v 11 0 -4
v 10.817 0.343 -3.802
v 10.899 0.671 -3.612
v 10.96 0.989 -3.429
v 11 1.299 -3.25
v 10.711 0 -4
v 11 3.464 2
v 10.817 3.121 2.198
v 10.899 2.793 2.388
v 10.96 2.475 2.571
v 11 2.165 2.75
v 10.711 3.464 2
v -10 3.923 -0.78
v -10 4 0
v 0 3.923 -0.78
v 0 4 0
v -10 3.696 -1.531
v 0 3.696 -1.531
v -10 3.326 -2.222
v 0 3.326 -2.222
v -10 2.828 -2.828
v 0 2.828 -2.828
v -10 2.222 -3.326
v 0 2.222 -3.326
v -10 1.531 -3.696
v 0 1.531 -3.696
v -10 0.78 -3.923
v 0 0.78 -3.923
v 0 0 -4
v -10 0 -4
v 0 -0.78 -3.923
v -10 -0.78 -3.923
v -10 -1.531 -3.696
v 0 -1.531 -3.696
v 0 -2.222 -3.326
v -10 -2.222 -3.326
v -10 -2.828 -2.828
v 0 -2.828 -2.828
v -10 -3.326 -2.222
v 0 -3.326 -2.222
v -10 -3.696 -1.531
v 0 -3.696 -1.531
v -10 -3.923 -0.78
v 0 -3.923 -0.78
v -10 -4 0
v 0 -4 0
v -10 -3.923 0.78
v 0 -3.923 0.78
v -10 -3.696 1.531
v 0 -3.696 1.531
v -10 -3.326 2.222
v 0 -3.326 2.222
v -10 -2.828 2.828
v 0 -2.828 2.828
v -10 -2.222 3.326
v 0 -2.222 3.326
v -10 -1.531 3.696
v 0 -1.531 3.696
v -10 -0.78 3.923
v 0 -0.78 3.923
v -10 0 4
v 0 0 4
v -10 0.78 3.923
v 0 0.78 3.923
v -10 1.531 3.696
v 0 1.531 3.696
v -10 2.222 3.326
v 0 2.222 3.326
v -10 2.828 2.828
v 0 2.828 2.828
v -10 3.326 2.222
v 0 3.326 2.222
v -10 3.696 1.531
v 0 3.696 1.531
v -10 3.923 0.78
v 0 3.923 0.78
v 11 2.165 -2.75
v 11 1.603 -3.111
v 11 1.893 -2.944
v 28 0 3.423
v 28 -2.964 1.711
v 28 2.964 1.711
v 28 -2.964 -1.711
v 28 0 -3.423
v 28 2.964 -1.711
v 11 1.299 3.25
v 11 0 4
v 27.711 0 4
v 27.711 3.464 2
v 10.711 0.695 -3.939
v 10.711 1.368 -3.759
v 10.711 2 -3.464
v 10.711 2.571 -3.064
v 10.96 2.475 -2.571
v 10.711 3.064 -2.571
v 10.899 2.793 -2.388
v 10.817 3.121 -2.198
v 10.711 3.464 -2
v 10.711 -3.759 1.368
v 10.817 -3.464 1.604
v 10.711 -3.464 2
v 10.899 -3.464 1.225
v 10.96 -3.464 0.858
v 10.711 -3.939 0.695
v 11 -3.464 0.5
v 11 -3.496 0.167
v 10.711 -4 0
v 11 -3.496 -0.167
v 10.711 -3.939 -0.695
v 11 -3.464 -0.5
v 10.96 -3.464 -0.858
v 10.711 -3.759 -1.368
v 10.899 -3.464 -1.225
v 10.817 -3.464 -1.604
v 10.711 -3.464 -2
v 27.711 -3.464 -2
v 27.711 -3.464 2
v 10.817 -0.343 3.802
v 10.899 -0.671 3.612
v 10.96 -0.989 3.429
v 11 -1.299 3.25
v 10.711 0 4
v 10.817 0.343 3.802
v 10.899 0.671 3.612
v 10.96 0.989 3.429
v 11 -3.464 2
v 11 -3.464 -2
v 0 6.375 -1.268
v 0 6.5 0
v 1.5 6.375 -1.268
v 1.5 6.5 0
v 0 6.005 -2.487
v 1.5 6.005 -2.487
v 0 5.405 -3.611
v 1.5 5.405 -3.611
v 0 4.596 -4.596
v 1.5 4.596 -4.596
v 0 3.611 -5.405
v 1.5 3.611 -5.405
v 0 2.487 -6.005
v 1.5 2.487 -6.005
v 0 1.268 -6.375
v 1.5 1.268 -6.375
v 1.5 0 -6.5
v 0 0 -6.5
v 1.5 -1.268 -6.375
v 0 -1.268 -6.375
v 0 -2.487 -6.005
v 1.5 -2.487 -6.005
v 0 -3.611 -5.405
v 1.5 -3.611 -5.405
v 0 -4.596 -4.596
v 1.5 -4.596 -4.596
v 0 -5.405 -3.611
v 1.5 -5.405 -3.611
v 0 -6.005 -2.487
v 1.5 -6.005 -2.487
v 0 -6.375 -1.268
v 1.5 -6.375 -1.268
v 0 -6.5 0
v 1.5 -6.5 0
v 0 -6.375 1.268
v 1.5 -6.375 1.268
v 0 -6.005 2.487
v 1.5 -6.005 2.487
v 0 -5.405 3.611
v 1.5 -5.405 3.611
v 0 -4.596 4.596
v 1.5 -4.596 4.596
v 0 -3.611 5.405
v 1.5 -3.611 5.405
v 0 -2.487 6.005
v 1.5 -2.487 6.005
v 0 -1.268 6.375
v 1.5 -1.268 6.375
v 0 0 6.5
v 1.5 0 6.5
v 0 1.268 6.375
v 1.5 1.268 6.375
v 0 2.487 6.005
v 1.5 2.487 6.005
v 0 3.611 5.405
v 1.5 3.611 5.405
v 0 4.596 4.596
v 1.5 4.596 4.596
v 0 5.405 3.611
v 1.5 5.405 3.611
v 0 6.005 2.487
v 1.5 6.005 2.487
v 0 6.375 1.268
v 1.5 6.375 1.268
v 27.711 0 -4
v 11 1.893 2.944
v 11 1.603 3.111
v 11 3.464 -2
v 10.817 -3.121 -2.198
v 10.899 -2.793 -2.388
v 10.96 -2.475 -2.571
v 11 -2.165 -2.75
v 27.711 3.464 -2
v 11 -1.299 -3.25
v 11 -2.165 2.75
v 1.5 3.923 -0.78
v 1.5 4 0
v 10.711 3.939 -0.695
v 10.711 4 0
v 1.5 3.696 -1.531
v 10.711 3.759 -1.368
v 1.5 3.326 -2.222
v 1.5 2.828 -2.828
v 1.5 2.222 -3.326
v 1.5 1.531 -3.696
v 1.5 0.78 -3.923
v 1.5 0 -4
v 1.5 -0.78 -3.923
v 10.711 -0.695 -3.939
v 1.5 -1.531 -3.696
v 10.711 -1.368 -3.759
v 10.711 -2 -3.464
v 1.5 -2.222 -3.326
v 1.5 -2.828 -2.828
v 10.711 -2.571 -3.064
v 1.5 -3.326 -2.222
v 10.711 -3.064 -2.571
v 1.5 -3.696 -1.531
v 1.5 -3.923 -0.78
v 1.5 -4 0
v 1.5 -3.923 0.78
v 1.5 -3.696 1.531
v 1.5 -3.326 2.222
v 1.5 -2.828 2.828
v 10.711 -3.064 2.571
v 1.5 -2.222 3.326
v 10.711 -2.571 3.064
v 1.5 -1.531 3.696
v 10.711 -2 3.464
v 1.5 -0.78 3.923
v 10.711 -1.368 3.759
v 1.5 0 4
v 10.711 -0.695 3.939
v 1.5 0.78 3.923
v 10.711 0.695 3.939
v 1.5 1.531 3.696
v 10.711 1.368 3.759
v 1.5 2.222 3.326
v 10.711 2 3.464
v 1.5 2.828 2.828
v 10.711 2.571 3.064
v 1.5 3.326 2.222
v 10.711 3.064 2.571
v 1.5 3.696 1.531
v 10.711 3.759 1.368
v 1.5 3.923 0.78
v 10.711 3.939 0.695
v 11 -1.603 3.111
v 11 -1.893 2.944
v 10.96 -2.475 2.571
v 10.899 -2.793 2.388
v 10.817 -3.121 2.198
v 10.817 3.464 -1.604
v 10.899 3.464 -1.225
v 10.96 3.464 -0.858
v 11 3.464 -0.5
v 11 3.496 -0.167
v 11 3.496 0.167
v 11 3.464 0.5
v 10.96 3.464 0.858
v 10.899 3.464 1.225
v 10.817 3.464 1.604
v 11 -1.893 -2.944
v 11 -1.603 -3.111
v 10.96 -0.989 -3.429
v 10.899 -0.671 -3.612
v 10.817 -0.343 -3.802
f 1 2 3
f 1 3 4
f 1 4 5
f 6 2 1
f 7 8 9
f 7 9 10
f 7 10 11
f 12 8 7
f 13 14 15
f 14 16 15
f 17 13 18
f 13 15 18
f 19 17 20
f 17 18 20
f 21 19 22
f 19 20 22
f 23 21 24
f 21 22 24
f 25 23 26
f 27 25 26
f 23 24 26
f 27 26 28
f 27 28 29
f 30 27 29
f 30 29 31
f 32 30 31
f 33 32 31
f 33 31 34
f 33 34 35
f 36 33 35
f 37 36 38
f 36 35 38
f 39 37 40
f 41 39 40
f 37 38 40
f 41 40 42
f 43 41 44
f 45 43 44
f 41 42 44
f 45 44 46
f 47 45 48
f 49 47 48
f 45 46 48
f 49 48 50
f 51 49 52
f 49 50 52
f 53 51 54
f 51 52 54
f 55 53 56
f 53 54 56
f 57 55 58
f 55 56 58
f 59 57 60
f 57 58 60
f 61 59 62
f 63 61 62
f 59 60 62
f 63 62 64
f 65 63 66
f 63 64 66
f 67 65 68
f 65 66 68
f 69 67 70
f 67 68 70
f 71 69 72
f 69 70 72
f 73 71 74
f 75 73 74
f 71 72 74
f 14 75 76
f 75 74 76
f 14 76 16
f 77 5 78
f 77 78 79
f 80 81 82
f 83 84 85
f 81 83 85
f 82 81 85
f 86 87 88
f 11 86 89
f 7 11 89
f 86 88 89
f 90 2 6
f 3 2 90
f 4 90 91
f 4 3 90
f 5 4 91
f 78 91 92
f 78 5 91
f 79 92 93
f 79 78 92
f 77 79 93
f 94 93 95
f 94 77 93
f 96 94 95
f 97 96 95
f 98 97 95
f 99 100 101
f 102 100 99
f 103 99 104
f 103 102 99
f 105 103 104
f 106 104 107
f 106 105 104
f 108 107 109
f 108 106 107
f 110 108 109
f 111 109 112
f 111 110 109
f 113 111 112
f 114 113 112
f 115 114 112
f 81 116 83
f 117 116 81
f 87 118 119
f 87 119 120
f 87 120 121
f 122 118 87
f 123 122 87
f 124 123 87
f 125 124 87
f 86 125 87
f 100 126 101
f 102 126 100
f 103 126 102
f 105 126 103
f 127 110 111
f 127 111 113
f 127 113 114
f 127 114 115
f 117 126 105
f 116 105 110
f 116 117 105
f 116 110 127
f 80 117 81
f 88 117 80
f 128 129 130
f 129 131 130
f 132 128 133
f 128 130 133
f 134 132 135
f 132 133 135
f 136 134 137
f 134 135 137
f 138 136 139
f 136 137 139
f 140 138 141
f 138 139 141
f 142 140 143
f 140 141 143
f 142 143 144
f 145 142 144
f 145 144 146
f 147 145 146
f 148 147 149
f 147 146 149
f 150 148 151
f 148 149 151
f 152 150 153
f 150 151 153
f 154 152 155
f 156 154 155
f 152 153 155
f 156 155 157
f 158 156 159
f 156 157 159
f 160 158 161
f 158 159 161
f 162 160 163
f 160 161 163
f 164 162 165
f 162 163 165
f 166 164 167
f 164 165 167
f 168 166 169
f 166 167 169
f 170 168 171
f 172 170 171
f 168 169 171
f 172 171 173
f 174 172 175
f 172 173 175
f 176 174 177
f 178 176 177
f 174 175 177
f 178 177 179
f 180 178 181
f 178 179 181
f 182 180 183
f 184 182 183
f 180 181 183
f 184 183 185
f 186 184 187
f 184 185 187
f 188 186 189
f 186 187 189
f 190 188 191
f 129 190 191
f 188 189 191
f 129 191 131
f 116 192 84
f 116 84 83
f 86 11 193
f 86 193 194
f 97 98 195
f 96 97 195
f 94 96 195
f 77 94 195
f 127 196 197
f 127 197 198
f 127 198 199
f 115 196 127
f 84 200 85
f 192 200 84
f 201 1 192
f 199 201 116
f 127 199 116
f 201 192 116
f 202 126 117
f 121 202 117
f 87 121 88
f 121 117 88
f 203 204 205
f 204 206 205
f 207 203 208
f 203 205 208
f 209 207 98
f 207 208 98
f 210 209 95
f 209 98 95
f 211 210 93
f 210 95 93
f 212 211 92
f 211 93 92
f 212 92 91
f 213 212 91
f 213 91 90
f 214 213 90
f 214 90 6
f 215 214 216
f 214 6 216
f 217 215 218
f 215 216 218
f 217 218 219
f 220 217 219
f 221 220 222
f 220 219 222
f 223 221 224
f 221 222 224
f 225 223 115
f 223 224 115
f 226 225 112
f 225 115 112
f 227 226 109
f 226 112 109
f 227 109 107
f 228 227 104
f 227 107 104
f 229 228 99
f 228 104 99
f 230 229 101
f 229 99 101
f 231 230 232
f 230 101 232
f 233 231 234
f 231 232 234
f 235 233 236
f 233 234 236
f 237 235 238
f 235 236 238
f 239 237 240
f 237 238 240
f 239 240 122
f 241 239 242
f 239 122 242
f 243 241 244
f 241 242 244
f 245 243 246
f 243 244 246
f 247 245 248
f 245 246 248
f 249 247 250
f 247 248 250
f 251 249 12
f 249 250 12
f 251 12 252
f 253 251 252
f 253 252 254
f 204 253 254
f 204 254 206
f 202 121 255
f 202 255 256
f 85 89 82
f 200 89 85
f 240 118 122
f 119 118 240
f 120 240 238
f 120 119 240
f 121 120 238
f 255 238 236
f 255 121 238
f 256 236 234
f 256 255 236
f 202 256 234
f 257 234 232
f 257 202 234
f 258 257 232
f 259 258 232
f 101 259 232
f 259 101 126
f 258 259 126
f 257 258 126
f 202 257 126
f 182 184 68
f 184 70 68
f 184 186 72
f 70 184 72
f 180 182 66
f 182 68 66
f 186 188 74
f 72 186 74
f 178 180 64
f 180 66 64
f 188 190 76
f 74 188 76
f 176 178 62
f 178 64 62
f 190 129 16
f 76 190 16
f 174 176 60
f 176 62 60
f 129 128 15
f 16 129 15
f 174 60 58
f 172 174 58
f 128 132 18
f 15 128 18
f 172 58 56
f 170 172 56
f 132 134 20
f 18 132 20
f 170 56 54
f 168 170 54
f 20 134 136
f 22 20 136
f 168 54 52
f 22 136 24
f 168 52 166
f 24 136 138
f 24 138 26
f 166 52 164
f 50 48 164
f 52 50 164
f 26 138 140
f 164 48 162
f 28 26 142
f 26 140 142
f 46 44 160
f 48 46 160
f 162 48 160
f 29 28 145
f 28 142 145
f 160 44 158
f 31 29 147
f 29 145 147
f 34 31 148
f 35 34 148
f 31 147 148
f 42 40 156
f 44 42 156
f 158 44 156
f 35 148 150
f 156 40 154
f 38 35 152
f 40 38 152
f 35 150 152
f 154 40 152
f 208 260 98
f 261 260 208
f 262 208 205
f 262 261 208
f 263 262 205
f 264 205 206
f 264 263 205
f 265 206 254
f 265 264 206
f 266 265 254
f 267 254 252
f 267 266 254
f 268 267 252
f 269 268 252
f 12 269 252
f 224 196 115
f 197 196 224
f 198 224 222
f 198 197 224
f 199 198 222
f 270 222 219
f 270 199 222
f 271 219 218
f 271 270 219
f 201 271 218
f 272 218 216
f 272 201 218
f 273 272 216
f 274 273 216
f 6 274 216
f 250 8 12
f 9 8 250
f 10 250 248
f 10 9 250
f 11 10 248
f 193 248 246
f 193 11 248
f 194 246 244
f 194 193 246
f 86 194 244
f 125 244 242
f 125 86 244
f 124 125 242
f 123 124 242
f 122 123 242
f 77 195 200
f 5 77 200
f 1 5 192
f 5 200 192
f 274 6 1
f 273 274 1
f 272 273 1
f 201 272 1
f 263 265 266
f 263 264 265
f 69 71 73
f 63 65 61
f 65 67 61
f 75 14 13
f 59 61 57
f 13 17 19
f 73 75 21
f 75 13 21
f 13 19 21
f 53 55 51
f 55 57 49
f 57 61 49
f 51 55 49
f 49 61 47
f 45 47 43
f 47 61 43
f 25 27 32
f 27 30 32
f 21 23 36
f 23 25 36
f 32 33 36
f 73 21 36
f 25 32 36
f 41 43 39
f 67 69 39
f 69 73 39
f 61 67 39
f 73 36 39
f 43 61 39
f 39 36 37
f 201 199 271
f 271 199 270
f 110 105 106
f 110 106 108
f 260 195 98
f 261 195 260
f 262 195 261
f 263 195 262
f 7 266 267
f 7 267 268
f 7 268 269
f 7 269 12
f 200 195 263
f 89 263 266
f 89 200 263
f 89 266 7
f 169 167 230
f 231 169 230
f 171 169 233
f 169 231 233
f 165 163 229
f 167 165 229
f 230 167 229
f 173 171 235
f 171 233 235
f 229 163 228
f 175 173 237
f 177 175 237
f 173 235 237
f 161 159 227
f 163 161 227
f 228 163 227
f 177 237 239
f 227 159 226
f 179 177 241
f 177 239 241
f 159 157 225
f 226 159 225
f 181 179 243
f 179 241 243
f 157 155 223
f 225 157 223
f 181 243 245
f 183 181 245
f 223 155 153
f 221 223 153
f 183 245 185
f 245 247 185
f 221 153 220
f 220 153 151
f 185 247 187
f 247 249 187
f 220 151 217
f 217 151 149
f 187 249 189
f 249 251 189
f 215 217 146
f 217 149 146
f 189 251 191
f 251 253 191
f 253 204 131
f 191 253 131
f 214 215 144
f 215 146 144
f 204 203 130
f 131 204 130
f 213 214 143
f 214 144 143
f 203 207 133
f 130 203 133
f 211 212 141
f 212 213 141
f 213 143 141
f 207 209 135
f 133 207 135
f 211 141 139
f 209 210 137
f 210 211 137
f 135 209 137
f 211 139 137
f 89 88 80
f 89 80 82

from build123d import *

# Parameters (mm, degrees)
CUT_EXTRUDE1_DEPTH = 17
CHAMFER1_SIZE      = 0.288675135
CHAMFER1_SIZE_2    = 0.5
CHAMFER2_SIZE      = 0.5
CHAMFER2_SIZE2     = 0.288675135


with BuildPart() as part:
    # Sketch2 → Revolve1 (revolve)
    with BuildSketch(Plane.XY):
        Polygon((0, 0), (-10, 0), (-10, 4), (0, 4), (0, 6.5), (1.5, 6.5), (1.5, 4), (28, 4), (28, 0), align=None)
    revolve(axis=Axis((28, 0, 0), (-1, 0, 0)))

    # Sketch3 → Cut-Extrude1 (cut)
    with BuildSketch(Plane(origin=(28, 0, 0), x_dir=(0, 0, -1), z_dir=(1, 0, 0))):
        with BuildLine():
            Line((-2, 3.464101615), (2, 3.464101615))
            ThreePointArc((2, 3.464101615), (0, 4), (-2, 3.464101615))
        make_face()
        with BuildLine():
            Line((2, 3.464101615), (4, 0))
            ThreePointArc((4, 0), (3.464101615, 2), (2, 3.464101615))
        make_face()
        with BuildLine():
            Line((-4, 0), (-2, 3.464101615))
            ThreePointArc((-2, 3.464101615), (-3.464101615, 2), (-4, 0))
        make_face()
        with BuildLine():
            ThreePointArc((-4, 0), (-3.464101615, -2), (-2, -3.464101615))
            Line((-2, -3.464101615), (-4, 0))
        make_face()
        with BuildLine():
            ThreePointArc((-2, -3.464101615), (0, -4), (2, -3.464101615))
            Line((2, -3.464101615), (-2, -3.464101615))
        make_face()
        with BuildLine():
            ThreePointArc((2, -3.464101615), (3.464101615, -2), (4, 0))
            Line((4, 0), (2, -3.464101615))
        make_face()
    extrude(amount=-CUT_EXTRUDE1_DEPTH, mode=Mode.SUBTRACT)

    # Chamfer1
    # the kernel refuses this chamfer: 0.5, 0.288675135 mm, written as the material it takes off along each edge
    with BuildSketch(Plane(origin=(11, 0, 0), x_dir=(0, -0.8660254037844389, -0.49999999999999956), z_dir=(0, -0.49999999999999956, 0.8660254037844389))) as chamfer1_piece_1_section:
        Polygon((4, -CHAMFER1_SIZE * 0.999999998596), (4 - CHAMFER1_SIZE_2, 0), (4, 0), align=None)
    chamfer1_piece_1 = revolve(axis=Axis((11, 0, 0), (1, 0, 0)), revolution_arc=60, mode=Mode.PRIVATE)
    chamfer1_piece_1 = split(chamfer1_piece_1, bisect_by=Plane(origin=(10.787249311, -3.461547111, -2.001474844), z_dir=(0, -0.4999999999999996, -0.8660254037844389)), keep=Keep.TOP, mode=Mode.PRIVATE)
    add(chamfer1_piece_1, mode=Mode.SUBTRACT)
    with BuildSketch(Plane(origin=(11, 0, 0), x_dir=(0, 0, 1), z_dir=(0, 1, 0))) as chamfer1_piece_2_section:
        Polygon((4, -CHAMFER1_SIZE * 0.999999998596), (4 - CHAMFER1_SIZE_2, 0), (4, 0), align=None)
    chamfer1_piece_2 = revolve(axis=Axis((11, 0, 0), (1, 0, 0)), revolution_arc=60, mode=Mode.PRIVATE)
    chamfer1_piece_2 = split(chamfer1_piece_2, bisect_by=Plane(origin=(10.787249311, -0.002554504, 3.998525156), z_dir=(0, -0.4999999999999999, 0.8660254037844387)), keep=Keep.TOP, mode=Mode.PRIVATE)
    add(chamfer1_piece_2, mode=Mode.SUBTRACT)
    with BuildSketch(Plane(origin=(11, 0, 0), x_dir=(0, 1, 0), z_dir=(0, 0, -1))) as chamfer1_piece_3_section:
        Polygon((4, -CHAMFER1_SIZE * 0.999999998596), (4 - CHAMFER1_SIZE_2, 0), (4, 0), align=None)
    chamfer1_piece_3 = revolve(axis=Axis((11, 0, 0), (1, 0, 0)), revolution_arc=30, mode=Mode.PRIVATE)
    chamfer1_piece_3 = split(chamfer1_piece_3, bisect_by=Plane(origin=(10.898935311, 3.464101615, 0.855614375), z_dir=(0, 1, 0)), keep=Keep.TOP, mode=Mode.PRIVATE)
    add(chamfer1_piece_3, mode=Mode.SUBTRACT)
    with BuildSketch(Plane(origin=(11, 0, 0), x_dir=(0, 0, -1), z_dir=(0, -1, 0))) as chamfer1_piece_4_section:
        Polygon((4, -CHAMFER1_SIZE * 0.999999998596), (4 - CHAMFER1_SIZE_2, 0), (4, 0), align=None)
    chamfer1_piece_4 = revolve(axis=Axis((11, 0, 0), (1, 0, 0)), revolution_arc=60, mode=Mode.PRIVATE)
    chamfer1_piece_4 = split(chamfer1_piece_4, bisect_by=Plane(origin=(10.787249311, 0.002554504, -3.998525156), z_dir=(0, 0.49999999999999983, -0.8660254037844388)), keep=Keep.TOP, mode=Mode.PRIVATE)
    add(chamfer1_piece_4, mode=Mode.SUBTRACT)
    with BuildSketch(Plane(origin=(11, 0, 0), x_dir=(0, 0.8660254037844386, 0.5000000000000003), z_dir=(0, 0.5000000000000003, -0.8660254037844386))) as chamfer1_piece_5_section:
        Polygon((4, -CHAMFER1_SIZE * 0.999999998596), (4 - CHAMFER1_SIZE_2, 0), (4, 0), align=None)
    chamfer1_piece_5 = revolve(axis=Axis((11, 0, 0), (1, 0, 0)), revolution_arc=60, mode=Mode.PRIVATE)
    chamfer1_piece_5 = split(chamfer1_piece_5, bisect_by=Plane(origin=(10.787249311, 3.461547111, 2.001474844), z_dir=(0, 0.5000000000000001, 0.8660254037844386)), keep=Keep.TOP, mode=Mode.PRIVATE)
    add(chamfer1_piece_5, mode=Mode.SUBTRACT)
    with BuildSketch(Plane(origin=(11, 0, 0), x_dir=(0, -0.8660254037844388, 0.4999999999999997), z_dir=(0, 0.4999999999999997, 0.8660254037844388))) as chamfer1_piece_6_section:
        Polygon((4, -CHAMFER1_SIZE * 0.999999998596), (4 - CHAMFER1_SIZE_2, 0), (4, 0), align=None)
    chamfer1_piece_6 = revolve(axis=Axis((11, 0, 0), (1, 0, 0)), revolution_arc=60, mode=Mode.PRIVATE)
    chamfer1_piece_6 = split(chamfer1_piece_6, bisect_by=Plane(origin=(10.787249311, -3.464101615, 1.997050313), z_dir=(0, -1, 0)), keep=Keep.TOP, mode=Mode.PRIVATE)
    add(chamfer1_piece_6, mode=Mode.SUBTRACT)
    with BuildSketch(Plane(origin=(11, 0, 0), x_dir=(0, 0.8660254037844385, -0.5000000000000003), z_dir=(0, -0.5000000000000003, -0.8660254037844385))) as chamfer1_piece_7_section:
        Polygon((4, -CHAMFER1_SIZE * 0.999999998596), (4 - CHAMFER1_SIZE_2, 0), (4, 0), align=None)
    chamfer1_piece_7 = revolve(axis=Axis((11, 0, 0), (1, 0, 0)), revolution_arc=30, mode=Mode.PRIVATE)
    chamfer1_piece_7 = split(chamfer1_piece_7, bisect_by=Plane(origin=(10.787249311, 3.464101615, -1.997050313), z_dir=(0, 1, 0)), keep=Keep.TOP, mode=Mode.PRIVATE)
    add(chamfer1_piece_7, mode=Mode.SUBTRACT)

    # Chamfer2
    chamfer2_edges = [part.edges().sort_by_distance(p)[0] for p in [
        (28, -1.732050808, -3),
        (28, -1.732050808, 3),
        (28, 3.464101615, 0),
        (28, 1.732050808, -3),
        (28, 1.732050808, 3),
        (28, -3.464101615, 0),
    ]]
    chamfer2_side = [part.faces().sort_by_distance(p)[0] for p in [
        (28, 0, 0),
    ]]
    chamfer(chamfer2_edges, length=CHAMFER2_SIZE, length2=CHAMFER2_SIZE2, reference=chamfer2_side[0])


solid = part.part
